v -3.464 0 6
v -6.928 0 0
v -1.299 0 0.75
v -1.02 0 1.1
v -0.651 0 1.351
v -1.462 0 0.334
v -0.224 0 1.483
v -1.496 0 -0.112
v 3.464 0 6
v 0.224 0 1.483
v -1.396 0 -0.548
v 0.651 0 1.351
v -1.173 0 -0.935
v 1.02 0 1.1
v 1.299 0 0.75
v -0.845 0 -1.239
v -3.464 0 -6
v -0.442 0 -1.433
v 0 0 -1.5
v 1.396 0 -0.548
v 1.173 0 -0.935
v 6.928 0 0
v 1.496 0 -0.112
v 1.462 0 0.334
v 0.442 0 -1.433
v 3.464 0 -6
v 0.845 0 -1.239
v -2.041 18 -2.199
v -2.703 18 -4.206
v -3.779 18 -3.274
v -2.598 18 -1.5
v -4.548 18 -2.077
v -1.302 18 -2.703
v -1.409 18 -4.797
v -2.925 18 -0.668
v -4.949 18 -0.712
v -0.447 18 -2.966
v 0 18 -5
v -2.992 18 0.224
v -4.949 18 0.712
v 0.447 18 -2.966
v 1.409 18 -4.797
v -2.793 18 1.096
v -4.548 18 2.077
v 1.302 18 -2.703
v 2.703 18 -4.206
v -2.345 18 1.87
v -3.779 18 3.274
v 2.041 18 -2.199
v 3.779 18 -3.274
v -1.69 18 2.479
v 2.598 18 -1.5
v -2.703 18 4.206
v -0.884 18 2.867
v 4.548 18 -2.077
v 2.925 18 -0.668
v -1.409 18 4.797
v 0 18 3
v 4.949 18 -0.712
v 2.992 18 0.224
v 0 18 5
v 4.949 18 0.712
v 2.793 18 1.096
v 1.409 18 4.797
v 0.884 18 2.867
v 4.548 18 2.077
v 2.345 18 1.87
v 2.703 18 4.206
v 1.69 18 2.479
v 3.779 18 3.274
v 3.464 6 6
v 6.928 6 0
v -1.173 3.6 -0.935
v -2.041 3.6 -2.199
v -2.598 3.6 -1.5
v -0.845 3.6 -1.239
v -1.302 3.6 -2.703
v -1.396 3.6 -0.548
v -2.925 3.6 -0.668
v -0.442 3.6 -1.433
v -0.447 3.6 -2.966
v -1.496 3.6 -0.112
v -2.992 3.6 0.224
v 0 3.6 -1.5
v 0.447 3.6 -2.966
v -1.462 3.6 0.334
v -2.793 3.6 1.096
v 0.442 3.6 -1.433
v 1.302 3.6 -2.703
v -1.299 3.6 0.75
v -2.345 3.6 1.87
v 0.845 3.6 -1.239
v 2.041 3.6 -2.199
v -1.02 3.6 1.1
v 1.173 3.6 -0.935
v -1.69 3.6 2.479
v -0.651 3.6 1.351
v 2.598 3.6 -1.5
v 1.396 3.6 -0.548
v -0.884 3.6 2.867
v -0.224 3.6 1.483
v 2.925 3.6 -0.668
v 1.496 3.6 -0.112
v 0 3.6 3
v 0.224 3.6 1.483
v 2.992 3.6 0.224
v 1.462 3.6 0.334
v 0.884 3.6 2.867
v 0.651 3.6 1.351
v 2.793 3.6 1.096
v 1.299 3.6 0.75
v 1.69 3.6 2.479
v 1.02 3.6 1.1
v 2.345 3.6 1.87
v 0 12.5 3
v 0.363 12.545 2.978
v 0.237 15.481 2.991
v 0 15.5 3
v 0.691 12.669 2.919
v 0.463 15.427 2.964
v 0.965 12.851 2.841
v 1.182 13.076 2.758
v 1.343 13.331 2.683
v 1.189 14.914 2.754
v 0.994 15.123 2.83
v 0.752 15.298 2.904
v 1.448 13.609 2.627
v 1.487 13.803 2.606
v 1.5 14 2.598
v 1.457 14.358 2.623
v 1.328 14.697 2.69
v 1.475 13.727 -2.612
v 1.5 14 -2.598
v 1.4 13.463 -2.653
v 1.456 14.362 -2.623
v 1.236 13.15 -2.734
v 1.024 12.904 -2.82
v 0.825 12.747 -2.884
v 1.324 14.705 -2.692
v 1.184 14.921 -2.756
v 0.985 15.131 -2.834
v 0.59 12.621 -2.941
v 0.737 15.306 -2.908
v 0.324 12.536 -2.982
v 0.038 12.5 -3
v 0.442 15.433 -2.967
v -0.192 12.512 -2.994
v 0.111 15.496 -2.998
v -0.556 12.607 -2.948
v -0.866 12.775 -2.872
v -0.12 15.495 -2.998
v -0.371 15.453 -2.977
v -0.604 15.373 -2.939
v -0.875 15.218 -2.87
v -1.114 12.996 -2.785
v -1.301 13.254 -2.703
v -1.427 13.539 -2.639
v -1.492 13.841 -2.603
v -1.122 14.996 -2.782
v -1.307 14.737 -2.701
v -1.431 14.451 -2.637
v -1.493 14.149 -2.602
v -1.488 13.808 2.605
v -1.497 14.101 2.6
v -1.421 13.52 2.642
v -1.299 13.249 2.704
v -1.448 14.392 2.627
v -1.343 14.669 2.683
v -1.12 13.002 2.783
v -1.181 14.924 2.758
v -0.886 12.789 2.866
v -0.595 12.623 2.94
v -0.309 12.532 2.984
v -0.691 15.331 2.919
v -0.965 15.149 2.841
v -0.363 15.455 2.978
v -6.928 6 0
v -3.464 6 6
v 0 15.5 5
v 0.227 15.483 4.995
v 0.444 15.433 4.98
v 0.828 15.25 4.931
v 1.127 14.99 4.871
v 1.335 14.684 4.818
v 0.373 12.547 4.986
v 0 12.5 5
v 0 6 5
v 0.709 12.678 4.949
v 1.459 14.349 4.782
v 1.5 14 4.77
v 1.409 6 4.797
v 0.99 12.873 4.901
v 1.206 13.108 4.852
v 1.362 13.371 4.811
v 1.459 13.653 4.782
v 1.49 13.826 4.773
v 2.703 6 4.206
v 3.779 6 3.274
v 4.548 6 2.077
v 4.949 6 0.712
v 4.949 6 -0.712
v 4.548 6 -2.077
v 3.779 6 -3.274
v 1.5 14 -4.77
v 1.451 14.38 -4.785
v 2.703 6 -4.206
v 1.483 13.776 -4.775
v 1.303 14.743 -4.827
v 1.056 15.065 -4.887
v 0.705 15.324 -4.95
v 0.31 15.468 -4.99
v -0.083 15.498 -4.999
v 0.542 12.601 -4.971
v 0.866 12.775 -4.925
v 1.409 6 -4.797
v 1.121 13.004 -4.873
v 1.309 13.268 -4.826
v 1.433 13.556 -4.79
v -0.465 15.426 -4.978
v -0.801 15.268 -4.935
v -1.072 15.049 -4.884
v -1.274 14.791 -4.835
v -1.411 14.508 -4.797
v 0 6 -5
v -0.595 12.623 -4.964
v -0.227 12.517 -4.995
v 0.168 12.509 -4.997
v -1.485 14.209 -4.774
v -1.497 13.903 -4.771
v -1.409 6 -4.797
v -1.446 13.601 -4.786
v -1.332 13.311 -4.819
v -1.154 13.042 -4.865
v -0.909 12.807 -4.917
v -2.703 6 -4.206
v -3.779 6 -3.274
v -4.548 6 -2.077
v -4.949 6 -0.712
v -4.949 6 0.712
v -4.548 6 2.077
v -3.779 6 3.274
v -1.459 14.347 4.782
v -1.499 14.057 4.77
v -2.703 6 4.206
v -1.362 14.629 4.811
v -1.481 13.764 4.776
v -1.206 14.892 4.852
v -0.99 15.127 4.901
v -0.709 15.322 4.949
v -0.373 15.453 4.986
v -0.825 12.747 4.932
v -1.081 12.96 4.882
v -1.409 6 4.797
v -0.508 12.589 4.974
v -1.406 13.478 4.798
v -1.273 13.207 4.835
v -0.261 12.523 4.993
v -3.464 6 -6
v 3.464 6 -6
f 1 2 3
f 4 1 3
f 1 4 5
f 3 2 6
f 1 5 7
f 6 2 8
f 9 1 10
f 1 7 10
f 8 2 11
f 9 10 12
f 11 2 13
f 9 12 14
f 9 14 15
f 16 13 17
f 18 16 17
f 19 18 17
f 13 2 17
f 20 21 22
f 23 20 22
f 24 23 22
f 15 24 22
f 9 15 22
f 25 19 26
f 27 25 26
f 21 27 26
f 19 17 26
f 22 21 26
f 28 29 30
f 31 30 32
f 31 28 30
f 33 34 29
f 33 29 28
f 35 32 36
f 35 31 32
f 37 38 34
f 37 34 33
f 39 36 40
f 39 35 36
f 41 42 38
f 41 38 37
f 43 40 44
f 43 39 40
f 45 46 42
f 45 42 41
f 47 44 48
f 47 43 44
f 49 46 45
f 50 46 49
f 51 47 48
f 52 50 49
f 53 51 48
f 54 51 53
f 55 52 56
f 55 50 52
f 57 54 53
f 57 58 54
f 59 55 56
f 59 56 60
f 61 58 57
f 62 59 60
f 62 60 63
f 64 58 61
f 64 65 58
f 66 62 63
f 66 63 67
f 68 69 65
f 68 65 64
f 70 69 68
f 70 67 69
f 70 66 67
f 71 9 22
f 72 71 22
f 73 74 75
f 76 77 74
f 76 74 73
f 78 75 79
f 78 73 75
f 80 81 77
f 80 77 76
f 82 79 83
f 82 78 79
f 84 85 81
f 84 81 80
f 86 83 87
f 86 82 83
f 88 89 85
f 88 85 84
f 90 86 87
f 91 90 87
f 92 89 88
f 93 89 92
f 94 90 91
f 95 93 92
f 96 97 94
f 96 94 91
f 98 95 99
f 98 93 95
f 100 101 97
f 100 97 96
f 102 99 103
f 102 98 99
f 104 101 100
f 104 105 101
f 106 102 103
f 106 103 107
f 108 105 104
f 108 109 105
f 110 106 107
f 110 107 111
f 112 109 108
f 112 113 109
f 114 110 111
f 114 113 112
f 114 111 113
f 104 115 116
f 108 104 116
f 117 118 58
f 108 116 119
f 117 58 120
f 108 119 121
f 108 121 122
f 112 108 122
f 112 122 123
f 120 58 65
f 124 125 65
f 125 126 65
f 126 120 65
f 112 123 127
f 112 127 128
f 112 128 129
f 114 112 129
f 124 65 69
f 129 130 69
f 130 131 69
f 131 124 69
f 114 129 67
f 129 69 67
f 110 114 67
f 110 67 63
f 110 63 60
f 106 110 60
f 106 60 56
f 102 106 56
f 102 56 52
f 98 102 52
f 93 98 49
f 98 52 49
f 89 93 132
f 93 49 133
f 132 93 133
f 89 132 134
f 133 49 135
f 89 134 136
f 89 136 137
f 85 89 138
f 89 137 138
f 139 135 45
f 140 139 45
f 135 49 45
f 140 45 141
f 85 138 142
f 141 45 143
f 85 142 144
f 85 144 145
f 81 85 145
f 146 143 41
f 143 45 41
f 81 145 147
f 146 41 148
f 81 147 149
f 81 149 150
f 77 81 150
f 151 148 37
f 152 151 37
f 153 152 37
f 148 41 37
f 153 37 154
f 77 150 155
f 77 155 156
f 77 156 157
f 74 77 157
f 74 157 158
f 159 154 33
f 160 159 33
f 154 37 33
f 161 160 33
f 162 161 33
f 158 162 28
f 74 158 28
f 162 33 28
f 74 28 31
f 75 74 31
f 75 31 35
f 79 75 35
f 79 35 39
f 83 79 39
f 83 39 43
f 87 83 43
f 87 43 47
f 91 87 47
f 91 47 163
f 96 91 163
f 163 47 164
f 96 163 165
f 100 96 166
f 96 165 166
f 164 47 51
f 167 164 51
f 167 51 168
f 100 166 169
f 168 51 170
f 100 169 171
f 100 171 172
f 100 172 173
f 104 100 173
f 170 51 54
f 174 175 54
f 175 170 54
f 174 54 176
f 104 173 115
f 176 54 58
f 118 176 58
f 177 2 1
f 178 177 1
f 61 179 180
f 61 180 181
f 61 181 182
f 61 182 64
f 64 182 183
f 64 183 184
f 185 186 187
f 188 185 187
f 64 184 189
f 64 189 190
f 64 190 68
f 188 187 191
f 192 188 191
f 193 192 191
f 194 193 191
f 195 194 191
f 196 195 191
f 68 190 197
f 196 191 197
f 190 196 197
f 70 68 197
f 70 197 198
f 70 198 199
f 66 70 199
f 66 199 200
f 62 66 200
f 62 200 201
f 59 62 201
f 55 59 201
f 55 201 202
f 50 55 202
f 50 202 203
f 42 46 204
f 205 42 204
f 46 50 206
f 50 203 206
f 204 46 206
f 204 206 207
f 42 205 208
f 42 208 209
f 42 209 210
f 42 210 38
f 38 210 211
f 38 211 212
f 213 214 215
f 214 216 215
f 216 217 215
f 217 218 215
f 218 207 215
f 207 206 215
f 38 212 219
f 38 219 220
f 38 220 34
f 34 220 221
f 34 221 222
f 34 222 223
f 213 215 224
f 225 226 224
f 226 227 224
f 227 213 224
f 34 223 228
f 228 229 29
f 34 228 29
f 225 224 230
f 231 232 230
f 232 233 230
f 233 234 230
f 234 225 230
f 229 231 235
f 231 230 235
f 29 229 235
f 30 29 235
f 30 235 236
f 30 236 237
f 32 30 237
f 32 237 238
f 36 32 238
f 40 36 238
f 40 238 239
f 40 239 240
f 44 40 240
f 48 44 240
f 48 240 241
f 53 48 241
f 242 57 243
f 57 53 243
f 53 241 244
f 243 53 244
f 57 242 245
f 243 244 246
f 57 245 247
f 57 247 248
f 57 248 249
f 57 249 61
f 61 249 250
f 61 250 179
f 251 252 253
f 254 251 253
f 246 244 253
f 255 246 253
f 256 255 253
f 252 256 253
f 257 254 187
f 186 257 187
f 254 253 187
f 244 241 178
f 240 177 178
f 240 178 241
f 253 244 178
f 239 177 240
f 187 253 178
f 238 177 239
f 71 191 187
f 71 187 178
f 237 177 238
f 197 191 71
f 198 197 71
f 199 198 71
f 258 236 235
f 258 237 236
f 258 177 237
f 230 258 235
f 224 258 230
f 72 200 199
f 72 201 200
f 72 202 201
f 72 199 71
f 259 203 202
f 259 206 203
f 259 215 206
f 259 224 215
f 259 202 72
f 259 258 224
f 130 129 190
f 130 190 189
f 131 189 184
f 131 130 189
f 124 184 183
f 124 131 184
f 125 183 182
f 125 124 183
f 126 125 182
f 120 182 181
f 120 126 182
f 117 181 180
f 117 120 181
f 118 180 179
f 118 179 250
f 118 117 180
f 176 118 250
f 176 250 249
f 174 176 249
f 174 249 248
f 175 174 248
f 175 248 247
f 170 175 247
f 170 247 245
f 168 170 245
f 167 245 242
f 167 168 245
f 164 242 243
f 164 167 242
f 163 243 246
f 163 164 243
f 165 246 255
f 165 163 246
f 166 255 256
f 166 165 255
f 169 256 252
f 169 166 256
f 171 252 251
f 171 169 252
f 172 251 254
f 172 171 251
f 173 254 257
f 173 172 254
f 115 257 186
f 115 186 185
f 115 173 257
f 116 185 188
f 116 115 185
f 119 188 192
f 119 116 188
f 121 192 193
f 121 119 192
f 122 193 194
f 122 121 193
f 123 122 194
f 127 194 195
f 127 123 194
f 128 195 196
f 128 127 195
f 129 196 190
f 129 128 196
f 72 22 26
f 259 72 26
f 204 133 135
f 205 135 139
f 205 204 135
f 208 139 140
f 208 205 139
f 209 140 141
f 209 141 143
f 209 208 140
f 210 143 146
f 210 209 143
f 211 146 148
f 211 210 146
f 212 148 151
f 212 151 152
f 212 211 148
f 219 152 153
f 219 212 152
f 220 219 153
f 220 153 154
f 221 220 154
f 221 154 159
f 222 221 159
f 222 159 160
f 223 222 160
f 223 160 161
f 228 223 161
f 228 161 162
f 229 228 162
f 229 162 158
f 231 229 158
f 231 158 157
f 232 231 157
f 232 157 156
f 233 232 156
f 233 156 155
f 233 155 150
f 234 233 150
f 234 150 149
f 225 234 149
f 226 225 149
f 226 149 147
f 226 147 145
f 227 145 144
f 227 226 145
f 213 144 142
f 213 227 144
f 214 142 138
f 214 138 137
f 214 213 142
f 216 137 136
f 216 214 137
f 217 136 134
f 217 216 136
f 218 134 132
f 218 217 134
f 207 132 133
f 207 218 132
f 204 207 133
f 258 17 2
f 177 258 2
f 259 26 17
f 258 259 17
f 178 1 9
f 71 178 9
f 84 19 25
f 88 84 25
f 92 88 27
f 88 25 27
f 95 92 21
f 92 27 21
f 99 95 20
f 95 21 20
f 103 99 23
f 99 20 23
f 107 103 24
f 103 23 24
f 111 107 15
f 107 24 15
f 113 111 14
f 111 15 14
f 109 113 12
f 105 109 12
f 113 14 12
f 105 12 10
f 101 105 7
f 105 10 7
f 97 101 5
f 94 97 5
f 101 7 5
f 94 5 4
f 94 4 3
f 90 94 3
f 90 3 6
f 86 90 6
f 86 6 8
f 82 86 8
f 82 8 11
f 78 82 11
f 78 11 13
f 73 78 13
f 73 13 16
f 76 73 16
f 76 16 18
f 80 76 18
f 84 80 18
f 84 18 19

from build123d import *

# Parameters (mm, degrees)
BOSS_EXTRUDE1_DEPTH     = 6
SKETCH3_R               = 5
BOSS_EXTRUDE2_DEPTH     = 12
SKETCH4_R               = 3
CUT_EXTRUDE1_DEPTH      = 14.4
CUT_EXTRUDE2_DEPTH      = 21.199009877
CUT_EXTRUDE2_DEPTH_BACK = 21.199009877
SKETCH5_R               = 1.5
SKETCH6_R               = 1.5
CUT_EXTRUDE3_DEPTH      = 14.4


with BuildPart() as part:
    # Sketch1 → Boss-Extrude1 (new body)
    with BuildSketch(Plane(origin=(0, 0, 0), x_dir=(1, 0, 0), z_dir=(0, 1, 0))):
        Polygon((6.92820323, 0), (3.464101615, 6), (-3.464101615, 6), (-6.92820323, 0), (-3.464101615, -6), (3.464101615, -6), align=None)
    extrude(amount=BOSS_EXTRUDE1_DEPTH)

    # Sketch3 → Boss-Extrude2 (add)
    with BuildSketch(Plane(origin=(0, 6, 0), x_dir=(1, 0, 0), z_dir=(0, 1, 0))):
        with Locations(Location((0, 0, 0), (0, 0, 270))):
            Circle(SKETCH3_R)
    extrude(amount=BOSS_EXTRUDE2_DEPTH)

    # Sketch4 → Cut-Extrude1 (cut)
    with BuildSketch(Plane(origin=(0, 18, 0), x_dir=(1, 0, 0), z_dir=(0, 1, 0))):
        with Locations(Location((0, 0, 0), (0, 0, 270))):
            Circle(SKETCH4_R)
    extrude(amount=-CUT_EXTRUDE1_DEPTH, mode=Mode.SUBTRACT)

    # Sketch5 → Cut-Extrude2 (cut, two sides: drawn at the far end of the back side and taken through both)
    with BuildSketch(Plane.XY.offset(-CUT_EXTRUDE2_DEPTH_BACK)):
        with Locations((0, 14)):
            Circle(SKETCH5_R)
    extrude(amount=CUT_EXTRUDE2_DEPTH + CUT_EXTRUDE2_DEPTH_BACK, mode=Mode.SUBTRACT)

    # Sketch6 → Cut-Extrude3 (cut)
    with BuildSketch(Plane.XZ):
        with Locations(Location((0, 0, 0), (0, 0, 270))):
            Circle(SKETCH6_R)
    extrude(amount=-CUT_EXTRUDE3_DEPTH, mode=Mode.SUBTRACT)


solid = part.part
